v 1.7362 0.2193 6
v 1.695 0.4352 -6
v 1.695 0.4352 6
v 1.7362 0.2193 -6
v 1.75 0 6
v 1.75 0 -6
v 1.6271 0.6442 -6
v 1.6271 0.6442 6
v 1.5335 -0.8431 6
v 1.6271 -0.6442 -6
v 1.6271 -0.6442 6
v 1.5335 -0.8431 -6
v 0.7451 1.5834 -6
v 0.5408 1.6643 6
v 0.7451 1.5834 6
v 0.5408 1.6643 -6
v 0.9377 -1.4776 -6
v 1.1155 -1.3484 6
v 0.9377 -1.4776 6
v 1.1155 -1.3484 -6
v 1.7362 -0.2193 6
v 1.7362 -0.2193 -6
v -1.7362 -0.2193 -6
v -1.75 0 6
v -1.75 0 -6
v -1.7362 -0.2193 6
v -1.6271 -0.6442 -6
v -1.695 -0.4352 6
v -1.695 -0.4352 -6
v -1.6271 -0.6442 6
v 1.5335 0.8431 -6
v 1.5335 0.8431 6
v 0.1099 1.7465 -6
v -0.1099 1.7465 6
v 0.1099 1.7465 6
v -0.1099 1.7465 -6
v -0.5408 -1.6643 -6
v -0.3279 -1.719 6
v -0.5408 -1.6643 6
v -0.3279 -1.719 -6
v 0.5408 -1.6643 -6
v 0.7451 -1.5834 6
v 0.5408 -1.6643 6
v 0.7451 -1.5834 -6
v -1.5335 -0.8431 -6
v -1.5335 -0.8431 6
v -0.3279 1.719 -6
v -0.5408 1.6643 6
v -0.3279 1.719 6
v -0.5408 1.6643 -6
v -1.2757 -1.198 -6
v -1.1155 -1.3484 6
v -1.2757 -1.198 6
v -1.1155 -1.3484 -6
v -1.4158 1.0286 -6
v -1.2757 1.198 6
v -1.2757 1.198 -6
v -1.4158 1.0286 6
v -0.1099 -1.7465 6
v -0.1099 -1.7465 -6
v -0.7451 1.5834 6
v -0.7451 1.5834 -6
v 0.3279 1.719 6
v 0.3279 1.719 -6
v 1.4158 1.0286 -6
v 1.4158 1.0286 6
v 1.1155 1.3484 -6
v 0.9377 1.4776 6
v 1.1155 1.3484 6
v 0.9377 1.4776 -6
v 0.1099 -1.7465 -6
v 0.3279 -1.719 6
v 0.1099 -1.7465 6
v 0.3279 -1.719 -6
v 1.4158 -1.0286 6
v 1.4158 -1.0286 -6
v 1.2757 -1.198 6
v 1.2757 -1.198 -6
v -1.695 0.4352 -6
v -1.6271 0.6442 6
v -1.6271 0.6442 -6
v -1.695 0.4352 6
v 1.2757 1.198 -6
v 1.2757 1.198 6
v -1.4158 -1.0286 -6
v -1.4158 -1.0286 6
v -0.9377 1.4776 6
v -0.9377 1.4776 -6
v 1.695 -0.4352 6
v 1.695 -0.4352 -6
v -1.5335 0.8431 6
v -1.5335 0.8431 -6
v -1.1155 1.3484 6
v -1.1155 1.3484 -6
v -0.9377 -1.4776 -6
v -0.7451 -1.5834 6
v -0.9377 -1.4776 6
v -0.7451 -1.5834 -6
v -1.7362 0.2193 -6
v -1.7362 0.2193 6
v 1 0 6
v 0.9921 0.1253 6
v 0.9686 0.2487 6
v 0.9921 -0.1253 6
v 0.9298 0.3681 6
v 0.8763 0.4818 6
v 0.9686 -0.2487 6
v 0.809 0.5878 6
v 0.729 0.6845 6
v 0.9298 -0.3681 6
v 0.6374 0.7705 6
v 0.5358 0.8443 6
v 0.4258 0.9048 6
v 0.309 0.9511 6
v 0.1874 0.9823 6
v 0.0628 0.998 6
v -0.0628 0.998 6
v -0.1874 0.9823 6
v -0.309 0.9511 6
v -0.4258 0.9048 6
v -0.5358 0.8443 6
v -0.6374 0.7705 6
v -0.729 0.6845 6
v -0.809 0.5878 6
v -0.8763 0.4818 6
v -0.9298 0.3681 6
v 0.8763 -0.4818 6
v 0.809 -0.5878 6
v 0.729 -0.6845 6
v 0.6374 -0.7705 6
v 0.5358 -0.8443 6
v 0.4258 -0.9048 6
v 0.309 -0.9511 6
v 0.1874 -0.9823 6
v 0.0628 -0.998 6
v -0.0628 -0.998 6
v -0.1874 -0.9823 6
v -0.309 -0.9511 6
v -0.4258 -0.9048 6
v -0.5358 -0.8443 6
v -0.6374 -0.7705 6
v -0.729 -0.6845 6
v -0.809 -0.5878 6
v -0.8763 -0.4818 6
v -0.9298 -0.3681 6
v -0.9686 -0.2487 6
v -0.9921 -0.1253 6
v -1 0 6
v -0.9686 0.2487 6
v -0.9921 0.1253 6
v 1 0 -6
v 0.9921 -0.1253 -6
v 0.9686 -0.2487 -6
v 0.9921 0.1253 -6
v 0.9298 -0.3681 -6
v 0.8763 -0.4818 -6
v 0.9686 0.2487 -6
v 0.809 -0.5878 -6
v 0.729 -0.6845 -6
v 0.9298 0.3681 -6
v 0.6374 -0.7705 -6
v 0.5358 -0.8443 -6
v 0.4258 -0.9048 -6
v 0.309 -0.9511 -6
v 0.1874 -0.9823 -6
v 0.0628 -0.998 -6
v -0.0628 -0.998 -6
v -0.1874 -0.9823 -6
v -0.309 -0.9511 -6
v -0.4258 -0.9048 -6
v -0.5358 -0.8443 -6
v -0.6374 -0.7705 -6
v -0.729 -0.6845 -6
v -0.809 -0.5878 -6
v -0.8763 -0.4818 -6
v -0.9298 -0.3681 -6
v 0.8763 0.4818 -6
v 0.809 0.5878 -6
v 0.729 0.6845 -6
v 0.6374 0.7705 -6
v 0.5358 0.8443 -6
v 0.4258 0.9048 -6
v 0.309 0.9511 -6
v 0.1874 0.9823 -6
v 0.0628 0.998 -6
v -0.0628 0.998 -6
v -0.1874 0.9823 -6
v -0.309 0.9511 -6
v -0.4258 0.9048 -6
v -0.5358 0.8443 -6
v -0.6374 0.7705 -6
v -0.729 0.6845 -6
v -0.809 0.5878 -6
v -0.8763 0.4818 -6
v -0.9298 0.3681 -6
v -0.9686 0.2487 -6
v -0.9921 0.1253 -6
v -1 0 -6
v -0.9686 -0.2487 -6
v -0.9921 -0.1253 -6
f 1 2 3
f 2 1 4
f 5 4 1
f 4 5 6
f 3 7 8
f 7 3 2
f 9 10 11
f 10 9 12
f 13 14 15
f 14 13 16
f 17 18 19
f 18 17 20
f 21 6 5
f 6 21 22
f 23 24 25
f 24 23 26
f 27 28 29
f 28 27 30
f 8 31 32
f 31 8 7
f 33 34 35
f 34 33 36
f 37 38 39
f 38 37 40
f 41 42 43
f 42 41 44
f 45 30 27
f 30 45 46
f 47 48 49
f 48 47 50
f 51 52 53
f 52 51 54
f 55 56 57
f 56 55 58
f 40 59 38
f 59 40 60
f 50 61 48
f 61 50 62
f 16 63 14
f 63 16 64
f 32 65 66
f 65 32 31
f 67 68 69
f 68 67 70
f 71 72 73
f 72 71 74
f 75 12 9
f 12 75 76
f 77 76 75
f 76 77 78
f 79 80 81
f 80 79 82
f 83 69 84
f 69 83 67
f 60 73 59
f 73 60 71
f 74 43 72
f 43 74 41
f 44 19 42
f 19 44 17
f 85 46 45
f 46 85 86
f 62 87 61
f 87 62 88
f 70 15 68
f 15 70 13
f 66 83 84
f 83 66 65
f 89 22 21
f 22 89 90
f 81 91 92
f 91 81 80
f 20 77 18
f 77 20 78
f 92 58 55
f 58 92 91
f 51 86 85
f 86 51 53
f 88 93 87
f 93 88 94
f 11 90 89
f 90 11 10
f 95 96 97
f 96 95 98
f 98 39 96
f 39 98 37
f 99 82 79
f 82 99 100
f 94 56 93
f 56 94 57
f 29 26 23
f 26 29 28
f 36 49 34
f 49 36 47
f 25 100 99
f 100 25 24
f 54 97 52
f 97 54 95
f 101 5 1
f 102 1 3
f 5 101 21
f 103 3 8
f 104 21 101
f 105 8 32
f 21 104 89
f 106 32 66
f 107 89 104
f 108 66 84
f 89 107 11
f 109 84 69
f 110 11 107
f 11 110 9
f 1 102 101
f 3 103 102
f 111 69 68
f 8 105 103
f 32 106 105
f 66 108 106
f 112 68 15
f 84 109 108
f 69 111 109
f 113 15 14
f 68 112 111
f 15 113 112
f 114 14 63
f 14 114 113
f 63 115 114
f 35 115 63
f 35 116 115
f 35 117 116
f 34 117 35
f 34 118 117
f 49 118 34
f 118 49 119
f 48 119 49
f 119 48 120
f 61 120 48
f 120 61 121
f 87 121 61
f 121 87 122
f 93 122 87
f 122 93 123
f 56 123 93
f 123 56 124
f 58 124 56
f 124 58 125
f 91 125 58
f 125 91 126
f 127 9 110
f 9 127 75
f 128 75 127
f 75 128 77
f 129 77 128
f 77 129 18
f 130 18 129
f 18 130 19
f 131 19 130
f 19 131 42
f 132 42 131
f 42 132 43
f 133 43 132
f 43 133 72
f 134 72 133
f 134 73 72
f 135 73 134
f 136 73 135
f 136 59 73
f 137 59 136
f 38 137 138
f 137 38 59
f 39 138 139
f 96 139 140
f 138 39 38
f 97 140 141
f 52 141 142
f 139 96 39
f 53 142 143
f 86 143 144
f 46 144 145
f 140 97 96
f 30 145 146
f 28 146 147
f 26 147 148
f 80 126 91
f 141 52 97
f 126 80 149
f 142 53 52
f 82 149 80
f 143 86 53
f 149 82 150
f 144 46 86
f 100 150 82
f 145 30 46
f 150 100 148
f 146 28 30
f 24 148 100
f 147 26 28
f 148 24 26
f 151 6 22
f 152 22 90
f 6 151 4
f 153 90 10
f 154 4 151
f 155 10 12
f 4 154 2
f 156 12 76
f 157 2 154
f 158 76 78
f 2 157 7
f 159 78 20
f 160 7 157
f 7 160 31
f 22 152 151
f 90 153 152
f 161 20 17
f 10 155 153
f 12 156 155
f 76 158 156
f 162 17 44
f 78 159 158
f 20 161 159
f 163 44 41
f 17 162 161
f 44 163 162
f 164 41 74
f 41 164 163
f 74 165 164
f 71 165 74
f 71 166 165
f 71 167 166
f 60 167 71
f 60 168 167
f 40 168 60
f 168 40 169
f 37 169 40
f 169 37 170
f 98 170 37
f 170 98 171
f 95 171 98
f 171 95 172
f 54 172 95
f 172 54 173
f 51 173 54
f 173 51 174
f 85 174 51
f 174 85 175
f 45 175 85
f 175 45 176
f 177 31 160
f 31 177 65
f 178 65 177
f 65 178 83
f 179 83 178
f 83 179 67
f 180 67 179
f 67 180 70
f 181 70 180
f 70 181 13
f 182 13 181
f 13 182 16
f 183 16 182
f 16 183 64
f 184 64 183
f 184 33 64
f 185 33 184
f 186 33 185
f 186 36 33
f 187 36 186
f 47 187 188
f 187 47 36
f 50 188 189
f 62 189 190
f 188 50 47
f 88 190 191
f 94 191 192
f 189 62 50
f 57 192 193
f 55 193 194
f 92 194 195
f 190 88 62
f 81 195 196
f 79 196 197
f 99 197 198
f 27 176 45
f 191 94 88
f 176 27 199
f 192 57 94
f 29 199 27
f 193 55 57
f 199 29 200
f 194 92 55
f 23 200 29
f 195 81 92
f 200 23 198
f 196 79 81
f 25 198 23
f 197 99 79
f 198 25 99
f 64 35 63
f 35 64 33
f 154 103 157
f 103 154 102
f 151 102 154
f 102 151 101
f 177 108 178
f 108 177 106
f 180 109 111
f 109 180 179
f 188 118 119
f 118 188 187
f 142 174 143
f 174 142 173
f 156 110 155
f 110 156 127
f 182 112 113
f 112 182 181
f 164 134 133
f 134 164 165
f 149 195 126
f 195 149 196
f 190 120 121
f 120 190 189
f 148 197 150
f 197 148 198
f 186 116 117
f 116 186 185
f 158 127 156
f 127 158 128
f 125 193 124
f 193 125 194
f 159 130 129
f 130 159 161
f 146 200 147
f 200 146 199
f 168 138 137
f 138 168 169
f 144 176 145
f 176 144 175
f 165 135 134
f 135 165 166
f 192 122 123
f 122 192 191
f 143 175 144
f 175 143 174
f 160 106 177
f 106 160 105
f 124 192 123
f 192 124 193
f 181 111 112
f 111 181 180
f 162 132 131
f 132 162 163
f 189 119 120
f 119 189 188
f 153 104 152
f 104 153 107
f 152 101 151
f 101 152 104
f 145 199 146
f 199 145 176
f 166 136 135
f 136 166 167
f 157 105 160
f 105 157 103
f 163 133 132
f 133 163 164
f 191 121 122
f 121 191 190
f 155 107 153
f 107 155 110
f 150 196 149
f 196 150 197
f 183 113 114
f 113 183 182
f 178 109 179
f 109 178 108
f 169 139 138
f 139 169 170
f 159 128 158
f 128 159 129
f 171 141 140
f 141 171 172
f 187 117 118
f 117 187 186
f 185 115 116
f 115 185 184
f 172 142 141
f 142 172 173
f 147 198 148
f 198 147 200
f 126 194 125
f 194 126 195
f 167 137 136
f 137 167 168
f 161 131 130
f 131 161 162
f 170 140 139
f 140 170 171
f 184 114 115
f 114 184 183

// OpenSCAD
$fn = 50;


difference() {
	union() {
		translate(v = [0, 0, -6.0000000000]) {
			cylinder(h = 12, r = 1.7500000000);
		}
	}
	union() {
		translate(v = [0, 0, -100.0000000000]) {
			cylinder(h = 200, r = 1.0000000000);
		}
	}
}
